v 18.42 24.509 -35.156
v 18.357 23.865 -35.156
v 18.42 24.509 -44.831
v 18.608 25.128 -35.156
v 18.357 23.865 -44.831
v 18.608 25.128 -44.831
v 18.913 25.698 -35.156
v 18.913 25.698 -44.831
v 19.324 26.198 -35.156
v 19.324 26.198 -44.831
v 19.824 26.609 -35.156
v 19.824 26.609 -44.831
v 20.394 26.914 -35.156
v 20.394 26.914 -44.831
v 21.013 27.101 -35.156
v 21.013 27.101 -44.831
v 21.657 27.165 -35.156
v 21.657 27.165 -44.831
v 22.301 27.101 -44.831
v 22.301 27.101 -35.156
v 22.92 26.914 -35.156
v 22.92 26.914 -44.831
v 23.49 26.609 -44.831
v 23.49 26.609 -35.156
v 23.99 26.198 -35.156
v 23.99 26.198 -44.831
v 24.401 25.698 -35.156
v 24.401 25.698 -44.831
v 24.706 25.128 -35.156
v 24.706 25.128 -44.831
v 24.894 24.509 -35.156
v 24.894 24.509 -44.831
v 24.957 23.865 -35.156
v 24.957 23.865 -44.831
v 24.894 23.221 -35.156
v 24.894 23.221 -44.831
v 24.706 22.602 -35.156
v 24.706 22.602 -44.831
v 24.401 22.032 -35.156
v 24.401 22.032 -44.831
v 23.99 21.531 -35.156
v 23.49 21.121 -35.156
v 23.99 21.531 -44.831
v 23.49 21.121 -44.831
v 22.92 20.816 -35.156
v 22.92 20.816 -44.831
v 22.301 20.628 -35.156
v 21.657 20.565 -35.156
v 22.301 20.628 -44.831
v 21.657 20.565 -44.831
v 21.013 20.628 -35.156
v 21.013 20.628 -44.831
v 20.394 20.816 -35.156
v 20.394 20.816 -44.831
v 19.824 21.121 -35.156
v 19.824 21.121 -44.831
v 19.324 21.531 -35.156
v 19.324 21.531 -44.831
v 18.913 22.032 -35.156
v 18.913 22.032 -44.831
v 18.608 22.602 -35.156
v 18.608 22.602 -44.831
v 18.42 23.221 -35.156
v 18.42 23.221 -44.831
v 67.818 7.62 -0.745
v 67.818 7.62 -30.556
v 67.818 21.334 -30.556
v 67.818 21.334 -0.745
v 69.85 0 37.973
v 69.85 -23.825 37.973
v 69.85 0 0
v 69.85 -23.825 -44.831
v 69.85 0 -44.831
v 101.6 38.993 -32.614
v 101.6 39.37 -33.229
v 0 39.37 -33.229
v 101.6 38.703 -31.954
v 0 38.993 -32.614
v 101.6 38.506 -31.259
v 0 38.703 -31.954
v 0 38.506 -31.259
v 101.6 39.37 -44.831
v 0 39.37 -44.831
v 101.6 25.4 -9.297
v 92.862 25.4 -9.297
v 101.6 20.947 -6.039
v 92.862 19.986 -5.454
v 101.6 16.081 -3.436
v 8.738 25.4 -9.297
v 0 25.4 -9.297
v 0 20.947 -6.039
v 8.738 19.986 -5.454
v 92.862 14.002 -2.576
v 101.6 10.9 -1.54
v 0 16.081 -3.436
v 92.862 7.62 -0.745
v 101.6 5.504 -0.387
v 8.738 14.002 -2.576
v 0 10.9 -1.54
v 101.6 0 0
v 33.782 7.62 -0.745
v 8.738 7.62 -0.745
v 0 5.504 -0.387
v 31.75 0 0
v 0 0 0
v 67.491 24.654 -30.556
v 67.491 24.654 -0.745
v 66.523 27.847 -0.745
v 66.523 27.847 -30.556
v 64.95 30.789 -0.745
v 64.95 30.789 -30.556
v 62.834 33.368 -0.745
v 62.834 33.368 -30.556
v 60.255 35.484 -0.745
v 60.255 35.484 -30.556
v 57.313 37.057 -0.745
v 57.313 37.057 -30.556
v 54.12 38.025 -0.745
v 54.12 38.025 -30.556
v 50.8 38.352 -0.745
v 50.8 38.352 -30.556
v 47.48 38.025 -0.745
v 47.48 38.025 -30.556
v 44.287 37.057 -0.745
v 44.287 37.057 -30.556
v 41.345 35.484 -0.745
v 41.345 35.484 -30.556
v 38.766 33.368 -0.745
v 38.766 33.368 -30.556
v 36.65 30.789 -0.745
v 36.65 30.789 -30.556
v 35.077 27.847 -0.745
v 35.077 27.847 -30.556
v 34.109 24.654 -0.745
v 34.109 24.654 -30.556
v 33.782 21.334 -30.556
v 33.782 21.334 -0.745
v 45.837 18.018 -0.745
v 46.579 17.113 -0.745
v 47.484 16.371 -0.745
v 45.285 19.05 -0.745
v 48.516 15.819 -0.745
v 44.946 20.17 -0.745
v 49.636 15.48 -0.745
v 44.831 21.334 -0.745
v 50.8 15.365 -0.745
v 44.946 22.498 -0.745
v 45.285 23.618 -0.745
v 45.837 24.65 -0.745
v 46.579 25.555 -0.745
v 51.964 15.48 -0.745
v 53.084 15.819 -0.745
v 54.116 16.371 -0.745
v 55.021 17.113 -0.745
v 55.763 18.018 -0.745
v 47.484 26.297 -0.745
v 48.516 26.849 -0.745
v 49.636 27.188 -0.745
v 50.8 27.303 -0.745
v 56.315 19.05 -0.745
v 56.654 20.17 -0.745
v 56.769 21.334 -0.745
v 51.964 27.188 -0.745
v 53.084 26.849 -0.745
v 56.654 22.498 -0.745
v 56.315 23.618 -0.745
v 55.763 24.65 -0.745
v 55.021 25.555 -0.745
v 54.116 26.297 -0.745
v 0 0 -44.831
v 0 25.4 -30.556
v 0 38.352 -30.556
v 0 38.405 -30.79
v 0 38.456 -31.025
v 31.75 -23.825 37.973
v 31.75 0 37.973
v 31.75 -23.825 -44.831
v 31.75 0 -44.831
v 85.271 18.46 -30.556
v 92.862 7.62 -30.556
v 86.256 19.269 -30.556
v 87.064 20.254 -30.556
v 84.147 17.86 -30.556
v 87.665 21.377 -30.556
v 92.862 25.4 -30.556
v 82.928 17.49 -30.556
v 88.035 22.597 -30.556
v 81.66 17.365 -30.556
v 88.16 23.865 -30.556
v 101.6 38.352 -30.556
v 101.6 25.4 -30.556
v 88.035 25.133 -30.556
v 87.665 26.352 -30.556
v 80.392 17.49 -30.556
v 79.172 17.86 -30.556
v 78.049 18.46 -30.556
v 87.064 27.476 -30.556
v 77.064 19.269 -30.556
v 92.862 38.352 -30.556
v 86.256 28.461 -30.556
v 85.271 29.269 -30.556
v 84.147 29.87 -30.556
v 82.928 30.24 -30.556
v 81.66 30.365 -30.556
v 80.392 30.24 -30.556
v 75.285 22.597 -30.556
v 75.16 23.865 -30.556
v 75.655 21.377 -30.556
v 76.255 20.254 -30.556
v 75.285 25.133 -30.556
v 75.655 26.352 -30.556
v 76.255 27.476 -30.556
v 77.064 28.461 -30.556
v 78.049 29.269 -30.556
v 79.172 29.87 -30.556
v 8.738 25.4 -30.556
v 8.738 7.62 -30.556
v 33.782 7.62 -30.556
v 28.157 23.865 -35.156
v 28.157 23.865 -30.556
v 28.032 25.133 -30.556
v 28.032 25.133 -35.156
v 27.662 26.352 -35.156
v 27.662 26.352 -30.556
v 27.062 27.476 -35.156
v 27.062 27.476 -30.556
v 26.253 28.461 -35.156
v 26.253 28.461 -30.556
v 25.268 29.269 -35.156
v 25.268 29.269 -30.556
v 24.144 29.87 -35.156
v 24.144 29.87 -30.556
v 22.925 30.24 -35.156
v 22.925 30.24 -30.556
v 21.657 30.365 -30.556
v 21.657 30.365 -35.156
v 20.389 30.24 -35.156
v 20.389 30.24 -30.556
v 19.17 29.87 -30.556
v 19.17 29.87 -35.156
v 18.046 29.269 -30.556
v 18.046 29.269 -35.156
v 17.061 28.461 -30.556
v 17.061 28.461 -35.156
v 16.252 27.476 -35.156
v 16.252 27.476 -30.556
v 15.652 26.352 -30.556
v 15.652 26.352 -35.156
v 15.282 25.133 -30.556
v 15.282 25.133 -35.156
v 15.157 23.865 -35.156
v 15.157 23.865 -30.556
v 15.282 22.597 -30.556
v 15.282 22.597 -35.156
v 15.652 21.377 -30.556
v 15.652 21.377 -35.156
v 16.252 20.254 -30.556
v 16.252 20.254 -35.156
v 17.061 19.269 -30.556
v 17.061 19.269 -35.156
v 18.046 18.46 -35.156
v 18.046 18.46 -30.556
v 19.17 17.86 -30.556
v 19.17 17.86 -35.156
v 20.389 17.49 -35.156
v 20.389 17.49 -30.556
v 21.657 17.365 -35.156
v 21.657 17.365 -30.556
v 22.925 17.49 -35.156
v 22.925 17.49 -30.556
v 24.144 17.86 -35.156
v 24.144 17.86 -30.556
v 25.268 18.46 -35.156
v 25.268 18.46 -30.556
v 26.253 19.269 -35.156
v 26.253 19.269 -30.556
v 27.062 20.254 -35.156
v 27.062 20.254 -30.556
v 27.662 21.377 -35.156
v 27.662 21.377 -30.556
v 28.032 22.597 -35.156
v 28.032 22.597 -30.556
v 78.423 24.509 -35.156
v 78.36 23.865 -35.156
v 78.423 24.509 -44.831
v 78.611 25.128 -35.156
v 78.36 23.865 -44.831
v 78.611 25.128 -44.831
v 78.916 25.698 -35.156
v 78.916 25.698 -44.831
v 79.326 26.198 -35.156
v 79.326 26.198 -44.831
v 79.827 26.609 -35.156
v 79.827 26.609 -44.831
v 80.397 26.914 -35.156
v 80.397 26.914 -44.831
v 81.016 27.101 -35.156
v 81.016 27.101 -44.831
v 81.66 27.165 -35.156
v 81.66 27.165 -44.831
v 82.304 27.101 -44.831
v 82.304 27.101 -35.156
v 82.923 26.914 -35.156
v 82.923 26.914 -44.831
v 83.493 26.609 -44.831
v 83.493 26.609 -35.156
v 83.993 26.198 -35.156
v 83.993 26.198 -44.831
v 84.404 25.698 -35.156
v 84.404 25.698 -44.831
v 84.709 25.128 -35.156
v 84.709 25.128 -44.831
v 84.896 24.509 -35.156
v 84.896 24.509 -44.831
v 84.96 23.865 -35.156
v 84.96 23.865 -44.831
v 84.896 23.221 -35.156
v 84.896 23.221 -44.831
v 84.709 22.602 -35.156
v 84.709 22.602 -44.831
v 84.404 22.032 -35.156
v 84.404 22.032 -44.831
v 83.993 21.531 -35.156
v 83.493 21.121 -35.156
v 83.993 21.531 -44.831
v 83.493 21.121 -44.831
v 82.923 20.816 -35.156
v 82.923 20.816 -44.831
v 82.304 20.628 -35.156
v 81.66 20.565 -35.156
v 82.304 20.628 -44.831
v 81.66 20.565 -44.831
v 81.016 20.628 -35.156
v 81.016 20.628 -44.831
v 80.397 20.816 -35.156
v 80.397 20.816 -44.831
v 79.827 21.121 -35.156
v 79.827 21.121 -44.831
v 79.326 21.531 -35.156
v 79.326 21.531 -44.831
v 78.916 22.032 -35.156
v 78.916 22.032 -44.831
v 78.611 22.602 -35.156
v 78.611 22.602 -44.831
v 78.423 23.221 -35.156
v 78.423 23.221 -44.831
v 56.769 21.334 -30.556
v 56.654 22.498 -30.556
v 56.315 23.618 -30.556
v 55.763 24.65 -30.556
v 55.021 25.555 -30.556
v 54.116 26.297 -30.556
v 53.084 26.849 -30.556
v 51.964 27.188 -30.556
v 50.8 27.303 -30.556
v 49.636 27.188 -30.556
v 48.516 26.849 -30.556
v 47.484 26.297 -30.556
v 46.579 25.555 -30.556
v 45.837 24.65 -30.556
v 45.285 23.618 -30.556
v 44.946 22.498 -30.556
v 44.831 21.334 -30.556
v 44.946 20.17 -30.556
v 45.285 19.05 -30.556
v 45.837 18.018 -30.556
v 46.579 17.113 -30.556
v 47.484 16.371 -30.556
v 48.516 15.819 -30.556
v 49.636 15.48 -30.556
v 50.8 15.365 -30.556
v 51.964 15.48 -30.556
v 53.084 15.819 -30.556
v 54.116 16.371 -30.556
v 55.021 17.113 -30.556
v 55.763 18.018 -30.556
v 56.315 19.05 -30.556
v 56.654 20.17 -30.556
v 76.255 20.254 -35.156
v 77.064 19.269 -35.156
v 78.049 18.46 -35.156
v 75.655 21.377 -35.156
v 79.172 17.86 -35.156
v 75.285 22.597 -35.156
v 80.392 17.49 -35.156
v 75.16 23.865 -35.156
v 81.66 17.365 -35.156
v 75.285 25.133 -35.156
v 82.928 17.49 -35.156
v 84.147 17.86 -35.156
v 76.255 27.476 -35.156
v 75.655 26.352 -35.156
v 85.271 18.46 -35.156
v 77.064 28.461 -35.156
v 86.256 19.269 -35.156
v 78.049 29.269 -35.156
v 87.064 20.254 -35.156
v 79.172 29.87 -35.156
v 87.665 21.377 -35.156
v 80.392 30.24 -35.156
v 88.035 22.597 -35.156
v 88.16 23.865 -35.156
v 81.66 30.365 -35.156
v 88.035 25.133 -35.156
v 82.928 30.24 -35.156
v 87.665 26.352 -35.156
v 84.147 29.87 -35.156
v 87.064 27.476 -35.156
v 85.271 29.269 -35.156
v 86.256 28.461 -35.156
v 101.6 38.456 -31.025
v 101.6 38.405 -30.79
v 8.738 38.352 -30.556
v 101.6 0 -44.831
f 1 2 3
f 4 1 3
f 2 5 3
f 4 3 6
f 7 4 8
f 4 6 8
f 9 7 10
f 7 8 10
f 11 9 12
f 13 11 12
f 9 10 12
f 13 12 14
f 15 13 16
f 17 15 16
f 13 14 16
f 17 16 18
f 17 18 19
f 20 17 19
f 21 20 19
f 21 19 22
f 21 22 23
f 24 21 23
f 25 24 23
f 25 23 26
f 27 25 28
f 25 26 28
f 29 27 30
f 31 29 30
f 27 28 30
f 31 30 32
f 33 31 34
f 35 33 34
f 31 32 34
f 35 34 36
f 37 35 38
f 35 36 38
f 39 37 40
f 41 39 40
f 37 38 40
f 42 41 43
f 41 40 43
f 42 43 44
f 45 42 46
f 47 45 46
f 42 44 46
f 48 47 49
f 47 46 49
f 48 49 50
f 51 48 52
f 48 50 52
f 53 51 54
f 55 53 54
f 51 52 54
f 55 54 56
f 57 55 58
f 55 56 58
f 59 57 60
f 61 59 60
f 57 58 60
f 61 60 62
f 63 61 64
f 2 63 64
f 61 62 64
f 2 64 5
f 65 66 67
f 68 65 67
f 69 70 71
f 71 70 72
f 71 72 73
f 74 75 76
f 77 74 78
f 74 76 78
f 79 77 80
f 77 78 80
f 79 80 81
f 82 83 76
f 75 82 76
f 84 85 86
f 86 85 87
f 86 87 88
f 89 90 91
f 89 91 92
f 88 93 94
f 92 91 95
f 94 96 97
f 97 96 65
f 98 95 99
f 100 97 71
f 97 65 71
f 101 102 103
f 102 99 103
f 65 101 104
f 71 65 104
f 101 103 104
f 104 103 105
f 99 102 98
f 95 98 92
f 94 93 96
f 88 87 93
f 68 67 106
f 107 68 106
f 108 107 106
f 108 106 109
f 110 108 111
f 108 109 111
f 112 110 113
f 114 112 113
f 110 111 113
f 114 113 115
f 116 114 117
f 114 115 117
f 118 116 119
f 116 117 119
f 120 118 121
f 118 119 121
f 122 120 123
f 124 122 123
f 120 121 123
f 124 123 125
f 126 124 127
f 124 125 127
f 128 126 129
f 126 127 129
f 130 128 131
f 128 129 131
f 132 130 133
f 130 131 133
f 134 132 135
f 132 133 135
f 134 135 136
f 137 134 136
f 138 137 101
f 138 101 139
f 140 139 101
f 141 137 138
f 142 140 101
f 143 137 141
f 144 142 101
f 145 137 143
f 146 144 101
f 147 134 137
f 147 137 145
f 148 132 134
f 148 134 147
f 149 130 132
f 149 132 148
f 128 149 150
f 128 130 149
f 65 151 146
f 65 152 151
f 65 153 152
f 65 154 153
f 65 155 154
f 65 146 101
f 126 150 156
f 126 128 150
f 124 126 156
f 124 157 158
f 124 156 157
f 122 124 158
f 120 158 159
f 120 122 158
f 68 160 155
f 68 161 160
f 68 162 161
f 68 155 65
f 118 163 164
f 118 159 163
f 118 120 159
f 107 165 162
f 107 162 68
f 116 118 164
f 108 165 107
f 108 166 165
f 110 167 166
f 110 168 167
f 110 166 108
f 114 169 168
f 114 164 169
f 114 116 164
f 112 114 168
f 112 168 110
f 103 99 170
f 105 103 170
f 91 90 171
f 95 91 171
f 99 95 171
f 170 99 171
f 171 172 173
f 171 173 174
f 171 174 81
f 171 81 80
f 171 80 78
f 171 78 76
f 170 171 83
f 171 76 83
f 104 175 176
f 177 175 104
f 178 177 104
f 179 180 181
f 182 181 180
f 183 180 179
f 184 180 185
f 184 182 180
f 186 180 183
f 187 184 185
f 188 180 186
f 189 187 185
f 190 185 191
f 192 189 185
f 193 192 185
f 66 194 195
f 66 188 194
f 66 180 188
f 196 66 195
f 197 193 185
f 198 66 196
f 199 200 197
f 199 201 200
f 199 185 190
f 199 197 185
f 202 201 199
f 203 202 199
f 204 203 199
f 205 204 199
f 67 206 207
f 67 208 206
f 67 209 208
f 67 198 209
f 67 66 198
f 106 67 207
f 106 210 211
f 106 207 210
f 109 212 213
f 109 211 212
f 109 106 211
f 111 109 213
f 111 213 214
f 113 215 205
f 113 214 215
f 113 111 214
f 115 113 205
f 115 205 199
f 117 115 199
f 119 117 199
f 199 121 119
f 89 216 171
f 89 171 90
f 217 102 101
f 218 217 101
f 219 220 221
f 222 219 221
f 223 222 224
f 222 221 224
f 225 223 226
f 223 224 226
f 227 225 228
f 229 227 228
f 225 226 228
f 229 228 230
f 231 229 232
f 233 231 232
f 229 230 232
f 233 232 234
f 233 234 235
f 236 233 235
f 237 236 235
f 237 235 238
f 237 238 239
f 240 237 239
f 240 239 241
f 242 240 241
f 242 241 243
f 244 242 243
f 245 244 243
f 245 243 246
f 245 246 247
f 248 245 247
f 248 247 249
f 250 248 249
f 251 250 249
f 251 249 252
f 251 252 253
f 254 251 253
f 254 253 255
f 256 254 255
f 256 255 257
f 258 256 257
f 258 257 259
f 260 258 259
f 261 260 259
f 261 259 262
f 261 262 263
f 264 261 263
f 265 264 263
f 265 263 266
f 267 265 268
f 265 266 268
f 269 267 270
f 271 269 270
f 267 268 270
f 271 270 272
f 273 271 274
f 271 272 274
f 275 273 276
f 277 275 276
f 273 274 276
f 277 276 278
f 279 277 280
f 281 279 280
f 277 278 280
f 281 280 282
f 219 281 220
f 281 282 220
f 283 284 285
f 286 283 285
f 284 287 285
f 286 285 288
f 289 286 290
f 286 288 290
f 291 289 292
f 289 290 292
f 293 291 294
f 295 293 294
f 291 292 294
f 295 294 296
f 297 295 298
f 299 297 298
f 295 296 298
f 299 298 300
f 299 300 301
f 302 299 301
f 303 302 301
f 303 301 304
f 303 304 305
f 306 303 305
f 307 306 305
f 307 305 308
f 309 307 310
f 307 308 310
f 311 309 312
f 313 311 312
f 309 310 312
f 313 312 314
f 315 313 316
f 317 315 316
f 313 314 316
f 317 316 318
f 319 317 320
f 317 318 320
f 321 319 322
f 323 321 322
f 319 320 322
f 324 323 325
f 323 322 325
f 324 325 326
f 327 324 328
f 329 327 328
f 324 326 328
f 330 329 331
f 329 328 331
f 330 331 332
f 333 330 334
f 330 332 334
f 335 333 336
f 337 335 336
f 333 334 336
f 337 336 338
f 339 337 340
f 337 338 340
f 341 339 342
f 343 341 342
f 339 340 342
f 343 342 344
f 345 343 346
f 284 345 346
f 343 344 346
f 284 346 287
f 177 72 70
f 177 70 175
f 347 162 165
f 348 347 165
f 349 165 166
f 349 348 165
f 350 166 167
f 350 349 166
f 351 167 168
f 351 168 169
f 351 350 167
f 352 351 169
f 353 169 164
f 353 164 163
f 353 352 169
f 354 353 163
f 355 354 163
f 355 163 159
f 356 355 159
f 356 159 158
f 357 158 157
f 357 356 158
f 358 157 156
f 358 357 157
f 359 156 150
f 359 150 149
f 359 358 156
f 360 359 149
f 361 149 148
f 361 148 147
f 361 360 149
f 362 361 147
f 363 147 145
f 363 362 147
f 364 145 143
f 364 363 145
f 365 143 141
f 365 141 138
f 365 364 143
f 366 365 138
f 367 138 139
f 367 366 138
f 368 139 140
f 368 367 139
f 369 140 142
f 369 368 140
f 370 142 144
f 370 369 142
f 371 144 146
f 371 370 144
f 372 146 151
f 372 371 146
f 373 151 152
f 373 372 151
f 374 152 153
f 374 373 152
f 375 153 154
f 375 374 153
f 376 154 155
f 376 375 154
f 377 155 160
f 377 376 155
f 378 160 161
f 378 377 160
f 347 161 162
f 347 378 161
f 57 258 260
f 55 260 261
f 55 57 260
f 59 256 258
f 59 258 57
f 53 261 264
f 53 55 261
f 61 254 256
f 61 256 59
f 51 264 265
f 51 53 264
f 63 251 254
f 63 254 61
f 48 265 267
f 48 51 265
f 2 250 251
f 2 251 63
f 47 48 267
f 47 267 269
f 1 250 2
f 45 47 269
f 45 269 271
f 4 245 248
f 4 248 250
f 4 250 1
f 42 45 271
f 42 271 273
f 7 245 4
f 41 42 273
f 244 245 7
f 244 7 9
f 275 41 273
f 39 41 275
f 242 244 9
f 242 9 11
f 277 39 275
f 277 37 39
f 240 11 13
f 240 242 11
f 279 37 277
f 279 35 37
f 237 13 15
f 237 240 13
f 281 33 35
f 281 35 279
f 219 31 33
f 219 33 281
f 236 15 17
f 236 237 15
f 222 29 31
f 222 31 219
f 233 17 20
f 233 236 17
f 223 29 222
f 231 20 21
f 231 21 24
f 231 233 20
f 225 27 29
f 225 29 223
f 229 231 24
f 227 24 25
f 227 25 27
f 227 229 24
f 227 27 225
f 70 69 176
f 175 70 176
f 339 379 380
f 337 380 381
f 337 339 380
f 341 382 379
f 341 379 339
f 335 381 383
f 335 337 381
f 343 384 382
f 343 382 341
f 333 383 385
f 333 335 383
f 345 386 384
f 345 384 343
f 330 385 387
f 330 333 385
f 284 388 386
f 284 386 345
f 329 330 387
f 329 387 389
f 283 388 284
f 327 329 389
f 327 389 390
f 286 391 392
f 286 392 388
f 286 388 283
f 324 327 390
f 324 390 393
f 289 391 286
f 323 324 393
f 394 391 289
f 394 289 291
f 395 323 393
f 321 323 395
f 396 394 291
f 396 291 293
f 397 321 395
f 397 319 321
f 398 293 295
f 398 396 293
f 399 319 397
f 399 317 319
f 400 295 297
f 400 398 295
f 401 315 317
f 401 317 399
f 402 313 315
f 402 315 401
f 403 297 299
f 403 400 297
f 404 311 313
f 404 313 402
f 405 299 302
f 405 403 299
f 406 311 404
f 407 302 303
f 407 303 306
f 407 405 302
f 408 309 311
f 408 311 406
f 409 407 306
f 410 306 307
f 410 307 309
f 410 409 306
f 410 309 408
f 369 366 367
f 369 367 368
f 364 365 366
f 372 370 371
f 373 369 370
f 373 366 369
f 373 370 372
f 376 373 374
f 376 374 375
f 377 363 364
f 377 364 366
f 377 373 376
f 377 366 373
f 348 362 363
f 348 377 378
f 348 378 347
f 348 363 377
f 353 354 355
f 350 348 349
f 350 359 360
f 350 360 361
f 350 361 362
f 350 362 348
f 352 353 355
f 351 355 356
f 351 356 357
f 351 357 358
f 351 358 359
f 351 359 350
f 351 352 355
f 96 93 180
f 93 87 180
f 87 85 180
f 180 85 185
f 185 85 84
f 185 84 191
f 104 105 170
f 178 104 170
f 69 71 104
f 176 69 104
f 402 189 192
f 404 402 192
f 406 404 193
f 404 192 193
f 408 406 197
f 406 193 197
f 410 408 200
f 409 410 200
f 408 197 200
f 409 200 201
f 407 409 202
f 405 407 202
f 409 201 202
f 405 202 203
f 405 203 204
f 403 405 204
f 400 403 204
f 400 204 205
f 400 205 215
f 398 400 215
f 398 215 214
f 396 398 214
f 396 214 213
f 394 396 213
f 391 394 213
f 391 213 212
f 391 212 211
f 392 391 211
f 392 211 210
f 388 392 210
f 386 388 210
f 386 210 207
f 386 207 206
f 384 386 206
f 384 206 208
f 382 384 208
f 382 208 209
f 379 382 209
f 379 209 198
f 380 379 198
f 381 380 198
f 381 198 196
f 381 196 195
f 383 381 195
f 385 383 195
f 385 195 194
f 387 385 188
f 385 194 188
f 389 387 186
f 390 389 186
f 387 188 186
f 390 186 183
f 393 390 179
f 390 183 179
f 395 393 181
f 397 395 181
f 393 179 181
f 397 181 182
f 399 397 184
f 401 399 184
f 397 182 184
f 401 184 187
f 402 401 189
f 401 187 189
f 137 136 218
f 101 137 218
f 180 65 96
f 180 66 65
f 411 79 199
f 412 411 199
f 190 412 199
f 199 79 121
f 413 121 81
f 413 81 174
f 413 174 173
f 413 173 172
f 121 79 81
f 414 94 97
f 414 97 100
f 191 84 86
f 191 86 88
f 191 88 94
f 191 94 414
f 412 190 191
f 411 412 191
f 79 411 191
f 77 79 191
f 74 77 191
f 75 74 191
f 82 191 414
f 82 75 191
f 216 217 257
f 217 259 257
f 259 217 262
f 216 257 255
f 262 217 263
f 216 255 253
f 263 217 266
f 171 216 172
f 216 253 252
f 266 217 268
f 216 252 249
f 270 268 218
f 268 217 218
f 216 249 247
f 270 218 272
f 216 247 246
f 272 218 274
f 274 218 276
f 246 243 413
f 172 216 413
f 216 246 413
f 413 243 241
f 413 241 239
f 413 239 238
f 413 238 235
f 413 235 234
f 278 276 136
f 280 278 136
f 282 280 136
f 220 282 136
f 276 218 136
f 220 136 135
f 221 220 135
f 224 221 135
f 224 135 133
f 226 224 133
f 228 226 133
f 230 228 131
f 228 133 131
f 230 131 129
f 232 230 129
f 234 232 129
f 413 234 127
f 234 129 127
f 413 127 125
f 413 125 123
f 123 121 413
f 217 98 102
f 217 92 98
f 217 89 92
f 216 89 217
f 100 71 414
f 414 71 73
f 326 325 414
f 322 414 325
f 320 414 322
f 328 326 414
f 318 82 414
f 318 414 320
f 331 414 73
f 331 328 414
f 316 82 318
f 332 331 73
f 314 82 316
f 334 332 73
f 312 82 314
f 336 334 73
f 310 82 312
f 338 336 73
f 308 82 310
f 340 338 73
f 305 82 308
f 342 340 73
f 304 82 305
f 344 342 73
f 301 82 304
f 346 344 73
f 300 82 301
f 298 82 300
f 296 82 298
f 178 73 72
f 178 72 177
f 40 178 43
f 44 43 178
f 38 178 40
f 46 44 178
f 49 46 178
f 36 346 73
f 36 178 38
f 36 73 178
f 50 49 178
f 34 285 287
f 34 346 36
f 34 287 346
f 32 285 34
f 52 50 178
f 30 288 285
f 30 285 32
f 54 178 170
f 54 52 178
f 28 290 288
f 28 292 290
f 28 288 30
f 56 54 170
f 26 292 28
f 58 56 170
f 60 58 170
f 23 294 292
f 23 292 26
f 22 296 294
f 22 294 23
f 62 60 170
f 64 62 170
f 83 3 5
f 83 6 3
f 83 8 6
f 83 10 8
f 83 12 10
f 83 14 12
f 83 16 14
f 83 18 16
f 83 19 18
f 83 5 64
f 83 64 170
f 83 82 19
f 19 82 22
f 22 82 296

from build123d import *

# Parameters (mm, degrees)
JAW_SIDE_EXTRUDE_DEPTH                           = 101.6
SKETCH2_W                                        = 84.1248
SKETCH2_H                                        = 30.5562
HOLLOW_CUT_EXTRUDE_DEPTH                         = 37.592
SKETCH3_R                                        = 5.969
SCREW_BOSS_EXTRUDE_DEPTH                         = 29.811288
SKETCH5_W                                        = 38.1
SKETCH5_H                                        = 23.8252
FOOT_EXTRUDE_DEPTH                               = 82.804
CBORE_FOR_M6_PAN_HEAD_MACHINE_SCREW1_D           = 6.6
CBORE_FOR_M6_PAN_HEAD_MACHINE_SCREW1_CBORE_D     = 13
CBORE_FOR_M6_PAN_HEAD_MACHINE_SCREW1_CBORE_DEPTH = 4.6
SKETCH12_W                                       = 14.651439237
SKETCH12_H                                       = 5.842
TOP_TRIM_CUT_EXTRUDE3_DEPTH                      = 120.902057968
SKETCH13_W                                       = 23.442855491
SKETCH13_H                                       = 12.95199816
WEB_TRIM_1_CUT_EXTRUDE4_DEPTH                    = 8.7376
SKETCH14_W                                       = 37.878491239
SKETCH14_H                                       = 12.95199816
WEB_TRIM_2_CUT_EXTRUDE5_DEPTH                    = 8.7376


with BuildPart() as part:
    # Sketch1 → Jaw side extrude (new body)
    with BuildSketch(Plane(origin=(0, 0, 0), x_dir=(0, 0, -1), z_dir=(1, 0, 0))):
        with BuildLine():
            Line((35.433, 45.212), (35.433, 43.647675453))
            ThreePointArc((35.433, 43.647675453), (34.258233808, 40.336625769), (31.259334135, 38.5064))
            ThreePointArc((31.259334135, 38.5064), (8.79859819, 24.798633085), (0, 0))
            Line((0, 0), (44.831, 0))
            Line((44.831, 0), (44.831, 45.212))
            Line((44.831, 45.212), (35.433, 45.212))
        make_face()
    extrude(amount=JAW_SIDE_EXTRUDE_DEPTH)

    # Sketch2 → Hollow cut extrude (cut)
    with BuildSketch(Plane(origin=(0, 45.212, 0), x_dir=(1, 0, 0), z_dir=(0, 1, 0))):
        with Locations((50.8, 15.2781)):
            Rectangle(SKETCH2_W, SKETCH2_H)
    extrude(amount=-HOLLOW_CUT_EXTRUDE_DEPTH, mode=Mode.SUBTRACT)

    # Sketch3 → Screw boss extrude (add)
    with BuildSketch(Plane.XY.offset(-30.5562)):
        with BuildLine():
            Line((67.818, 7.62), (67.818, 21.33399816))
            ThreePointArc((67.818, 21.33399816), (50.8, 38.35199816), (33.782, 21.33399816))
            Line((33.782, 21.33399816), (33.782, 7.62))
            Line((33.782, 7.62), (67.818, 7.62))
        make_face()
        with Locations((50.8, 21.33399816)):
            Circle(SKETCH3_R, mode=Mode.SUBTRACT)
    extrude(amount=SCREW_BOSS_EXTRUDE_DEPTH)

    # Sketch5 → Foot extrude (add)
    with BuildSketch(Plane(origin=(0, 0, -44.831), x_dir=(-1, 0, 0), z_dir=(0, 0, -1))):
        with Locations((-50.8, -11.9126)):
            Rectangle(SKETCH5_W, SKETCH5_H)
    extrude(amount=-FOOT_EXTRUDE_DEPTH)

    # CBORE for M6 Pan Head Machine Screw1 (through all)
    with Locations(Plane(origin=(50.8, -38.1, -30.5562), x_dir=(1, 0, 0), z_dir=(0, 0, 1))):
        with Locations((-29.14300736, 61.964884424), (30.859893074, 61.964884424)):
            CounterBoreHole(CBORE_FOR_M6_PAN_HEAD_MACHINE_SCREW1_D / 2, CBORE_FOR_M6_PAN_HEAD_MACHINE_SCREW1_CBORE_D / 2, CBORE_FOR_M6_PAN_HEAD_MACHINE_SCREW1_CBORE_DEPTH)

    # Sketch12 → top trim Cut-Extrude3 (cut, through all)
    with BuildSketch(Plane.ZY):
        with Locations((-37.505280382, 42.291)):
            Rectangle(SKETCH12_W, SKETCH12_H)
    extrude(amount=-TOP_TRIM_CUT_EXTRUDE3_DEPTH, mode=Mode.SUBTRACT)

    # Sketch13 → web trim 1 Cut-Extrude4 (cut)
    with BuildSketch(Plane.ZY.offset(-8.7376)):
        with Locations((-18.834772254, 31.87599908)):
            Rectangle(SKETCH13_W, SKETCH13_H)
    extrude(amount=WEB_TRIM_1_CUT_EXTRUDE4_DEPTH, mode=Mode.SUBTRACT)

    # Sketch14 → web trim 2 Cut-Extrude5 (cut)
    with BuildSketch(Plane(origin=(92.8624, 0, 0), x_dir=(0, 0, -1), z_dir=(1, 0, 0))):
        with Locations((11.616954381, 31.87599908)):
            Rectangle(SKETCH14_W, SKETCH14_H)
    extrude(amount=WEB_TRIM_2_CUT_EXTRUDE5_DEPTH, mode=Mode.SUBTRACT)


solid = part.part
